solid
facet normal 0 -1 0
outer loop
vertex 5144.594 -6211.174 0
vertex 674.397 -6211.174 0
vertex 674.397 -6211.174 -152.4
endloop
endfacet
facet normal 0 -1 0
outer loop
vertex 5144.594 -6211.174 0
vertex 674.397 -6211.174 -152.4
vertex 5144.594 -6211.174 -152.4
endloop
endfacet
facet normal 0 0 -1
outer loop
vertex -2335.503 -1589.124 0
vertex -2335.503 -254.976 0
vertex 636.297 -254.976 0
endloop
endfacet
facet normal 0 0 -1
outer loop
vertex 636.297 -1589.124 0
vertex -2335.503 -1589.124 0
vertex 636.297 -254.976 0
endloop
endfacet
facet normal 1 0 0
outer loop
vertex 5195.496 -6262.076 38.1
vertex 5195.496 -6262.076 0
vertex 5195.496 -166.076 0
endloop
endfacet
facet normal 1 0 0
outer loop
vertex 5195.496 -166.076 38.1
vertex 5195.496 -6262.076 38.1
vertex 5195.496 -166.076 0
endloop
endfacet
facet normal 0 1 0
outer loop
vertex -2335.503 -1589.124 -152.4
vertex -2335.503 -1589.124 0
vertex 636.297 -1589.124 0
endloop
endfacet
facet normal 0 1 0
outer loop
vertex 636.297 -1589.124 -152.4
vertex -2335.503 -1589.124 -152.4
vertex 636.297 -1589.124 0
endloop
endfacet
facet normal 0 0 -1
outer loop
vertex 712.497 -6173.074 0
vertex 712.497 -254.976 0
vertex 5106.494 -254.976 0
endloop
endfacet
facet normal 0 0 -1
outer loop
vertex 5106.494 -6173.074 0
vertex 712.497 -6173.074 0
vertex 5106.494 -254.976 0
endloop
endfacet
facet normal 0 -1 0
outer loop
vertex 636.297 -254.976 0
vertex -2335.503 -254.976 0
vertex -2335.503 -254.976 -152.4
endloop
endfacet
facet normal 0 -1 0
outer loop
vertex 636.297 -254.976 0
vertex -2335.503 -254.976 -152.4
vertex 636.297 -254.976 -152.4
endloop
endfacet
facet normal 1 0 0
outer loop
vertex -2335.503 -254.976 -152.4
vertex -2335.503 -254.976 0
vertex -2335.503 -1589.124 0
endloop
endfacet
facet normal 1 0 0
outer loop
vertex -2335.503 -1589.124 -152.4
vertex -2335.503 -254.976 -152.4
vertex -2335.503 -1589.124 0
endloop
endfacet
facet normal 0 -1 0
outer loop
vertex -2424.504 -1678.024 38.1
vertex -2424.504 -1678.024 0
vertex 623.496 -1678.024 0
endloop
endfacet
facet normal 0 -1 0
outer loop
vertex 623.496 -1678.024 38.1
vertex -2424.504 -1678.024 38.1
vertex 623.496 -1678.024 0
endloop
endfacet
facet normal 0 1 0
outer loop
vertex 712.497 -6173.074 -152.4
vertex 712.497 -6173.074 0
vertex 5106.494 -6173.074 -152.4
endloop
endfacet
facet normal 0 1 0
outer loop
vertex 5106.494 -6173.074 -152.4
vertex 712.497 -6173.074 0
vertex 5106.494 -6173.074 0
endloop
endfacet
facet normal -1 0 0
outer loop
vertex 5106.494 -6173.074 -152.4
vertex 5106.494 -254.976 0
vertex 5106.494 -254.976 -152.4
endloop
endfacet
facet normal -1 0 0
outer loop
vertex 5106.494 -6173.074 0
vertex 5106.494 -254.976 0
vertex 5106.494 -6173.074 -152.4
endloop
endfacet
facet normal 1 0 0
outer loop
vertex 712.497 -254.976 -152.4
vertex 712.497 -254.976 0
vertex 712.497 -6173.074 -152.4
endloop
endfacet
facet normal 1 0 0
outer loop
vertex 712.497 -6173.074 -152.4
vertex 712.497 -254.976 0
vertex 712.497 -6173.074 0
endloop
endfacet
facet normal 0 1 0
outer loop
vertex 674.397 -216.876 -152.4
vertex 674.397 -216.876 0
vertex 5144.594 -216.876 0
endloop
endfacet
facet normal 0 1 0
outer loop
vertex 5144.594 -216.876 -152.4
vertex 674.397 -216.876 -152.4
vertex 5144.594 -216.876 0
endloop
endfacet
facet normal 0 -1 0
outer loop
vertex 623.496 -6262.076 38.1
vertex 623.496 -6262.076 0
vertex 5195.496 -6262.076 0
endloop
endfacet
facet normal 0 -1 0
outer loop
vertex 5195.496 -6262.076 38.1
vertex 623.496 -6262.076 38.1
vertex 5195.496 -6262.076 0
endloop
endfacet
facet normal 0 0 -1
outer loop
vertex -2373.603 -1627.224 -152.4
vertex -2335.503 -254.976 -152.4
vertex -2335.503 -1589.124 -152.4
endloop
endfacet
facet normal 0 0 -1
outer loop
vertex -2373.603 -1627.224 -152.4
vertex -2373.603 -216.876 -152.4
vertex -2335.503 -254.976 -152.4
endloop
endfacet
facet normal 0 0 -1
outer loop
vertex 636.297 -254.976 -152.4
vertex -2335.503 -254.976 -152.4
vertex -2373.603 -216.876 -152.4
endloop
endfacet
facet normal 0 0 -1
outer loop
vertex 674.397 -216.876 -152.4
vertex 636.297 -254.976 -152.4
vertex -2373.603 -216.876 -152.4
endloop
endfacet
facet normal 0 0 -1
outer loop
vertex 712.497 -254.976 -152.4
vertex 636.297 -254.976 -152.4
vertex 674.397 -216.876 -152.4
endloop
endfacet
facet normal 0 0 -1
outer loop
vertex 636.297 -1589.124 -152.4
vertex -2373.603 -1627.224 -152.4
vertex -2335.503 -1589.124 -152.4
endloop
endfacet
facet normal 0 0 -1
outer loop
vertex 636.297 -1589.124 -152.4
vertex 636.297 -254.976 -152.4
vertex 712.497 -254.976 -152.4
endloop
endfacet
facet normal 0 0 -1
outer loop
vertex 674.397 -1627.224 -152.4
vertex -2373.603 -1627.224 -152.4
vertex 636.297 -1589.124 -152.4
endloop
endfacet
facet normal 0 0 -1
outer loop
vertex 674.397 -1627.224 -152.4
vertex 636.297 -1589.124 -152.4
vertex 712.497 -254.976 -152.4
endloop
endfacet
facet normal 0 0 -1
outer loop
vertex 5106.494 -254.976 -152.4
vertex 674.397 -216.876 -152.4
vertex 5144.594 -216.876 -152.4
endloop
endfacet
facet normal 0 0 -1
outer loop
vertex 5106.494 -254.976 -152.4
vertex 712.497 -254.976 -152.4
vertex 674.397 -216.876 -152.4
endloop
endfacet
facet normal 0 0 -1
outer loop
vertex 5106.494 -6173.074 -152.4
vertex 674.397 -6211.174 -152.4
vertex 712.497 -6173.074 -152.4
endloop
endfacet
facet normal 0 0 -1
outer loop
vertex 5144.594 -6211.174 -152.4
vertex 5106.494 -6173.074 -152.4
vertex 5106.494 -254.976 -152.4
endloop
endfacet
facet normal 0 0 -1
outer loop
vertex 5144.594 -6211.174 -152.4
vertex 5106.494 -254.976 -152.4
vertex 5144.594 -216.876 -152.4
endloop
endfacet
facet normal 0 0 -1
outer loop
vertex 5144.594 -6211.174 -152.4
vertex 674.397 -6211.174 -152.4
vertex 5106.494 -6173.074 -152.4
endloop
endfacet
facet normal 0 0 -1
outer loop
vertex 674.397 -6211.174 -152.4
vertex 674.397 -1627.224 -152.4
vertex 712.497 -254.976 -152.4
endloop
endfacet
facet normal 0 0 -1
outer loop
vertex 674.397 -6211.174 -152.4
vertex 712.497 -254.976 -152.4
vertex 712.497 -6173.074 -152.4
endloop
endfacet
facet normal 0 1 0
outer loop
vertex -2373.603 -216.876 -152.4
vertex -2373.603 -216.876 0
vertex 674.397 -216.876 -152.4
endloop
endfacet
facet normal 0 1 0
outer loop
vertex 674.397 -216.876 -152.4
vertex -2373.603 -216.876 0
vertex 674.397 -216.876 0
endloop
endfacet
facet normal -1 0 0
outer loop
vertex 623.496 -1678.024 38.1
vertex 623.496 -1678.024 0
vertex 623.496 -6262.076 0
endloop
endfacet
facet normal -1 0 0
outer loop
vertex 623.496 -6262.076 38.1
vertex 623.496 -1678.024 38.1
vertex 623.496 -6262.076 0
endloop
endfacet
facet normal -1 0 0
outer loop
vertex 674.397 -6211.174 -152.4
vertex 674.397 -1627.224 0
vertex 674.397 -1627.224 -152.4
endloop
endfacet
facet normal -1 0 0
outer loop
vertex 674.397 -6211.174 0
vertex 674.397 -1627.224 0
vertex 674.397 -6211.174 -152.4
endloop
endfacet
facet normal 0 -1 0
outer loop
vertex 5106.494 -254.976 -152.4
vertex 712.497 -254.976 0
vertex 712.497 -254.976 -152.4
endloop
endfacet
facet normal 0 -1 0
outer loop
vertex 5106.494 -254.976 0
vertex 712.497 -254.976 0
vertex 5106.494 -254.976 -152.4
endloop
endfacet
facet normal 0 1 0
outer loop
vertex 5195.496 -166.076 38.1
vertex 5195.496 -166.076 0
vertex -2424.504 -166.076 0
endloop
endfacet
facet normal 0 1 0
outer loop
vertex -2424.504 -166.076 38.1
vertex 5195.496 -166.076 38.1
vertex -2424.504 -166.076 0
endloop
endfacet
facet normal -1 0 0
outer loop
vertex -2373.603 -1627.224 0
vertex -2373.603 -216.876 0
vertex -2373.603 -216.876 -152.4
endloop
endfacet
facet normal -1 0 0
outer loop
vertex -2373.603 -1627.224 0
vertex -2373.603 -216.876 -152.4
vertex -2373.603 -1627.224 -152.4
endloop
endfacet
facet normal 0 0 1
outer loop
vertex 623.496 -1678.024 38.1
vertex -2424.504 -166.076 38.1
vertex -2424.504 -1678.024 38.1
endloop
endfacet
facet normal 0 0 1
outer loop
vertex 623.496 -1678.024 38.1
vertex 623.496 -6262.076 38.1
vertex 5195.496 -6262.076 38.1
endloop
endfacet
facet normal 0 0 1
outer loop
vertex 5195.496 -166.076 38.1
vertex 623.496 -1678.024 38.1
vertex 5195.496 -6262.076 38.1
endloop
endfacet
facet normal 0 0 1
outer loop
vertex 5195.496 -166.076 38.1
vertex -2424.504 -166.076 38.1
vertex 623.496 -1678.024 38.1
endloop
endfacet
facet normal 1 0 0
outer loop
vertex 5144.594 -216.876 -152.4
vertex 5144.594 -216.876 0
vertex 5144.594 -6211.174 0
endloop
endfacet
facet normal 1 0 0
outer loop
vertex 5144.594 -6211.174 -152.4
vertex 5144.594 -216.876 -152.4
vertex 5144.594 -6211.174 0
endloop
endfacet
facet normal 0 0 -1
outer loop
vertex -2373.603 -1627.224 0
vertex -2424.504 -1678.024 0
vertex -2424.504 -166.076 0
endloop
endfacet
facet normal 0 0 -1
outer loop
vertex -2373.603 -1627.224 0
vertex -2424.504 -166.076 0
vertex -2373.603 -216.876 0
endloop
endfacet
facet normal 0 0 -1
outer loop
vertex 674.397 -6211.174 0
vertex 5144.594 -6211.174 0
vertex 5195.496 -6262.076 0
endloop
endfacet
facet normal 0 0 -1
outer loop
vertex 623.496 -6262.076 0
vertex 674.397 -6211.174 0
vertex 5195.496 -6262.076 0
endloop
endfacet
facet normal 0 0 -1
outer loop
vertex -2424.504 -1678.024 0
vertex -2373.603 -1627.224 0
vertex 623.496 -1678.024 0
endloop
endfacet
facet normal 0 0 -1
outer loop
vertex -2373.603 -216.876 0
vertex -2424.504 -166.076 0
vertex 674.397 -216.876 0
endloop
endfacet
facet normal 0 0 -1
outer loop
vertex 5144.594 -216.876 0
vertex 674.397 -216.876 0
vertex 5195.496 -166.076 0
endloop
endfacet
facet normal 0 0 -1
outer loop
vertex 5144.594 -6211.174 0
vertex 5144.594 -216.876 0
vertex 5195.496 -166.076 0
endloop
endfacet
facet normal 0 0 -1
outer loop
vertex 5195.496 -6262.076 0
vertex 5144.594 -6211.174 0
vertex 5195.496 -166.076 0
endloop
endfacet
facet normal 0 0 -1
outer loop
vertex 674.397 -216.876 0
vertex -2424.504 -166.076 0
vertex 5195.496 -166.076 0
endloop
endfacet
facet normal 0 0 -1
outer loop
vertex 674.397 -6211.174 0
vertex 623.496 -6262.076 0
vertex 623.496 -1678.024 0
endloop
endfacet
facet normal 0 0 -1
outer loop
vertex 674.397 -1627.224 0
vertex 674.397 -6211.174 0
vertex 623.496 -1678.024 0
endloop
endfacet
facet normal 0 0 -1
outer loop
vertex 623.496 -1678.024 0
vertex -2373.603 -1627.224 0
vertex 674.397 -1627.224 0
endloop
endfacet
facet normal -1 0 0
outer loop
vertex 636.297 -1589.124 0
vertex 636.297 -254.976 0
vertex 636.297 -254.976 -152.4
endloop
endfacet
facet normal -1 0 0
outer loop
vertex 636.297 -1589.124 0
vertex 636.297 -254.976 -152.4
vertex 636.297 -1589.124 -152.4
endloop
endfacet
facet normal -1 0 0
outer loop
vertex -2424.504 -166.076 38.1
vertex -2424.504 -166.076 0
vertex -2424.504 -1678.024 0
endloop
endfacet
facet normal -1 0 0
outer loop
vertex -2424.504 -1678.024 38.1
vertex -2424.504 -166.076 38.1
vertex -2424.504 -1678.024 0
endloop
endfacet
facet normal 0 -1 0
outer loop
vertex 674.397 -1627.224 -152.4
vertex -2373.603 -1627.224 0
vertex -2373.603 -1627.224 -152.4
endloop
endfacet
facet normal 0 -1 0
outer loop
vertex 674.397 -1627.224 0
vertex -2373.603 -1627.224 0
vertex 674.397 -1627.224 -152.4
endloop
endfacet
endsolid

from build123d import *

# Parameters (mm, degrees)
F1_DEPTH = 38.1
F2_W     = 4470.1968
F2_H     = 5994.2984
F2_W_2   = 4393.9968
F2_H_2   = 5918.0984
F3_DEPTH = 152.4
F4_W     = 3048
F4_H     = 1410.348555
F4_W_2   = 2971.8
F4_H_2   = 1334.148555
F5_DEPTH = 152.4


with BuildPart() as f1:
    # F0 (on Top) → F1 (new body)
    with BuildSketch(Plane.XY):
        Polygon((5195.49572, -166.075737), (623.49572, -166.075737), (-2424.50428, -166.075737), (-2424.50428, -1678.024292), (623.49572, -1678.024292), (623.49572, -6262.075737), (5195.49572, -6262.075737), align=None)
    extrude(amount=F1_DEPTH)

    # F2 (on face) → F3 (join)
    with BuildSketch(Plane(origin=(0, 0, 0), x_dir=(1, 0, 0), z_dir=(0, 0, -1))):
        with Locations((2909.49572, 3214.024937)):
            Rectangle(F2_W, F2_H)
        with Locations((2909.49572, 3214.024937)):
            Rectangle(F2_W_2, F2_H_2, mode=Mode.SUBTRACT)
    extrude(amount=F3_DEPTH)

    # F4 (on face) → F5 (join, through all)
    with BuildSketch(Plane(origin=(0, 0, 0), x_dir=(1, 0, 0), z_dir=(0, 0, -1))):
        with Locations((-849.60268, 922.050014)):
            Rectangle(F4_W, F4_H)
        with Locations((-849.60268, 922.050014)):
            Rectangle(F4_W_2, F4_H_2, mode=Mode.SUBTRACT)
    extrude(amount=F5_DEPTH)


solid = f1.part
